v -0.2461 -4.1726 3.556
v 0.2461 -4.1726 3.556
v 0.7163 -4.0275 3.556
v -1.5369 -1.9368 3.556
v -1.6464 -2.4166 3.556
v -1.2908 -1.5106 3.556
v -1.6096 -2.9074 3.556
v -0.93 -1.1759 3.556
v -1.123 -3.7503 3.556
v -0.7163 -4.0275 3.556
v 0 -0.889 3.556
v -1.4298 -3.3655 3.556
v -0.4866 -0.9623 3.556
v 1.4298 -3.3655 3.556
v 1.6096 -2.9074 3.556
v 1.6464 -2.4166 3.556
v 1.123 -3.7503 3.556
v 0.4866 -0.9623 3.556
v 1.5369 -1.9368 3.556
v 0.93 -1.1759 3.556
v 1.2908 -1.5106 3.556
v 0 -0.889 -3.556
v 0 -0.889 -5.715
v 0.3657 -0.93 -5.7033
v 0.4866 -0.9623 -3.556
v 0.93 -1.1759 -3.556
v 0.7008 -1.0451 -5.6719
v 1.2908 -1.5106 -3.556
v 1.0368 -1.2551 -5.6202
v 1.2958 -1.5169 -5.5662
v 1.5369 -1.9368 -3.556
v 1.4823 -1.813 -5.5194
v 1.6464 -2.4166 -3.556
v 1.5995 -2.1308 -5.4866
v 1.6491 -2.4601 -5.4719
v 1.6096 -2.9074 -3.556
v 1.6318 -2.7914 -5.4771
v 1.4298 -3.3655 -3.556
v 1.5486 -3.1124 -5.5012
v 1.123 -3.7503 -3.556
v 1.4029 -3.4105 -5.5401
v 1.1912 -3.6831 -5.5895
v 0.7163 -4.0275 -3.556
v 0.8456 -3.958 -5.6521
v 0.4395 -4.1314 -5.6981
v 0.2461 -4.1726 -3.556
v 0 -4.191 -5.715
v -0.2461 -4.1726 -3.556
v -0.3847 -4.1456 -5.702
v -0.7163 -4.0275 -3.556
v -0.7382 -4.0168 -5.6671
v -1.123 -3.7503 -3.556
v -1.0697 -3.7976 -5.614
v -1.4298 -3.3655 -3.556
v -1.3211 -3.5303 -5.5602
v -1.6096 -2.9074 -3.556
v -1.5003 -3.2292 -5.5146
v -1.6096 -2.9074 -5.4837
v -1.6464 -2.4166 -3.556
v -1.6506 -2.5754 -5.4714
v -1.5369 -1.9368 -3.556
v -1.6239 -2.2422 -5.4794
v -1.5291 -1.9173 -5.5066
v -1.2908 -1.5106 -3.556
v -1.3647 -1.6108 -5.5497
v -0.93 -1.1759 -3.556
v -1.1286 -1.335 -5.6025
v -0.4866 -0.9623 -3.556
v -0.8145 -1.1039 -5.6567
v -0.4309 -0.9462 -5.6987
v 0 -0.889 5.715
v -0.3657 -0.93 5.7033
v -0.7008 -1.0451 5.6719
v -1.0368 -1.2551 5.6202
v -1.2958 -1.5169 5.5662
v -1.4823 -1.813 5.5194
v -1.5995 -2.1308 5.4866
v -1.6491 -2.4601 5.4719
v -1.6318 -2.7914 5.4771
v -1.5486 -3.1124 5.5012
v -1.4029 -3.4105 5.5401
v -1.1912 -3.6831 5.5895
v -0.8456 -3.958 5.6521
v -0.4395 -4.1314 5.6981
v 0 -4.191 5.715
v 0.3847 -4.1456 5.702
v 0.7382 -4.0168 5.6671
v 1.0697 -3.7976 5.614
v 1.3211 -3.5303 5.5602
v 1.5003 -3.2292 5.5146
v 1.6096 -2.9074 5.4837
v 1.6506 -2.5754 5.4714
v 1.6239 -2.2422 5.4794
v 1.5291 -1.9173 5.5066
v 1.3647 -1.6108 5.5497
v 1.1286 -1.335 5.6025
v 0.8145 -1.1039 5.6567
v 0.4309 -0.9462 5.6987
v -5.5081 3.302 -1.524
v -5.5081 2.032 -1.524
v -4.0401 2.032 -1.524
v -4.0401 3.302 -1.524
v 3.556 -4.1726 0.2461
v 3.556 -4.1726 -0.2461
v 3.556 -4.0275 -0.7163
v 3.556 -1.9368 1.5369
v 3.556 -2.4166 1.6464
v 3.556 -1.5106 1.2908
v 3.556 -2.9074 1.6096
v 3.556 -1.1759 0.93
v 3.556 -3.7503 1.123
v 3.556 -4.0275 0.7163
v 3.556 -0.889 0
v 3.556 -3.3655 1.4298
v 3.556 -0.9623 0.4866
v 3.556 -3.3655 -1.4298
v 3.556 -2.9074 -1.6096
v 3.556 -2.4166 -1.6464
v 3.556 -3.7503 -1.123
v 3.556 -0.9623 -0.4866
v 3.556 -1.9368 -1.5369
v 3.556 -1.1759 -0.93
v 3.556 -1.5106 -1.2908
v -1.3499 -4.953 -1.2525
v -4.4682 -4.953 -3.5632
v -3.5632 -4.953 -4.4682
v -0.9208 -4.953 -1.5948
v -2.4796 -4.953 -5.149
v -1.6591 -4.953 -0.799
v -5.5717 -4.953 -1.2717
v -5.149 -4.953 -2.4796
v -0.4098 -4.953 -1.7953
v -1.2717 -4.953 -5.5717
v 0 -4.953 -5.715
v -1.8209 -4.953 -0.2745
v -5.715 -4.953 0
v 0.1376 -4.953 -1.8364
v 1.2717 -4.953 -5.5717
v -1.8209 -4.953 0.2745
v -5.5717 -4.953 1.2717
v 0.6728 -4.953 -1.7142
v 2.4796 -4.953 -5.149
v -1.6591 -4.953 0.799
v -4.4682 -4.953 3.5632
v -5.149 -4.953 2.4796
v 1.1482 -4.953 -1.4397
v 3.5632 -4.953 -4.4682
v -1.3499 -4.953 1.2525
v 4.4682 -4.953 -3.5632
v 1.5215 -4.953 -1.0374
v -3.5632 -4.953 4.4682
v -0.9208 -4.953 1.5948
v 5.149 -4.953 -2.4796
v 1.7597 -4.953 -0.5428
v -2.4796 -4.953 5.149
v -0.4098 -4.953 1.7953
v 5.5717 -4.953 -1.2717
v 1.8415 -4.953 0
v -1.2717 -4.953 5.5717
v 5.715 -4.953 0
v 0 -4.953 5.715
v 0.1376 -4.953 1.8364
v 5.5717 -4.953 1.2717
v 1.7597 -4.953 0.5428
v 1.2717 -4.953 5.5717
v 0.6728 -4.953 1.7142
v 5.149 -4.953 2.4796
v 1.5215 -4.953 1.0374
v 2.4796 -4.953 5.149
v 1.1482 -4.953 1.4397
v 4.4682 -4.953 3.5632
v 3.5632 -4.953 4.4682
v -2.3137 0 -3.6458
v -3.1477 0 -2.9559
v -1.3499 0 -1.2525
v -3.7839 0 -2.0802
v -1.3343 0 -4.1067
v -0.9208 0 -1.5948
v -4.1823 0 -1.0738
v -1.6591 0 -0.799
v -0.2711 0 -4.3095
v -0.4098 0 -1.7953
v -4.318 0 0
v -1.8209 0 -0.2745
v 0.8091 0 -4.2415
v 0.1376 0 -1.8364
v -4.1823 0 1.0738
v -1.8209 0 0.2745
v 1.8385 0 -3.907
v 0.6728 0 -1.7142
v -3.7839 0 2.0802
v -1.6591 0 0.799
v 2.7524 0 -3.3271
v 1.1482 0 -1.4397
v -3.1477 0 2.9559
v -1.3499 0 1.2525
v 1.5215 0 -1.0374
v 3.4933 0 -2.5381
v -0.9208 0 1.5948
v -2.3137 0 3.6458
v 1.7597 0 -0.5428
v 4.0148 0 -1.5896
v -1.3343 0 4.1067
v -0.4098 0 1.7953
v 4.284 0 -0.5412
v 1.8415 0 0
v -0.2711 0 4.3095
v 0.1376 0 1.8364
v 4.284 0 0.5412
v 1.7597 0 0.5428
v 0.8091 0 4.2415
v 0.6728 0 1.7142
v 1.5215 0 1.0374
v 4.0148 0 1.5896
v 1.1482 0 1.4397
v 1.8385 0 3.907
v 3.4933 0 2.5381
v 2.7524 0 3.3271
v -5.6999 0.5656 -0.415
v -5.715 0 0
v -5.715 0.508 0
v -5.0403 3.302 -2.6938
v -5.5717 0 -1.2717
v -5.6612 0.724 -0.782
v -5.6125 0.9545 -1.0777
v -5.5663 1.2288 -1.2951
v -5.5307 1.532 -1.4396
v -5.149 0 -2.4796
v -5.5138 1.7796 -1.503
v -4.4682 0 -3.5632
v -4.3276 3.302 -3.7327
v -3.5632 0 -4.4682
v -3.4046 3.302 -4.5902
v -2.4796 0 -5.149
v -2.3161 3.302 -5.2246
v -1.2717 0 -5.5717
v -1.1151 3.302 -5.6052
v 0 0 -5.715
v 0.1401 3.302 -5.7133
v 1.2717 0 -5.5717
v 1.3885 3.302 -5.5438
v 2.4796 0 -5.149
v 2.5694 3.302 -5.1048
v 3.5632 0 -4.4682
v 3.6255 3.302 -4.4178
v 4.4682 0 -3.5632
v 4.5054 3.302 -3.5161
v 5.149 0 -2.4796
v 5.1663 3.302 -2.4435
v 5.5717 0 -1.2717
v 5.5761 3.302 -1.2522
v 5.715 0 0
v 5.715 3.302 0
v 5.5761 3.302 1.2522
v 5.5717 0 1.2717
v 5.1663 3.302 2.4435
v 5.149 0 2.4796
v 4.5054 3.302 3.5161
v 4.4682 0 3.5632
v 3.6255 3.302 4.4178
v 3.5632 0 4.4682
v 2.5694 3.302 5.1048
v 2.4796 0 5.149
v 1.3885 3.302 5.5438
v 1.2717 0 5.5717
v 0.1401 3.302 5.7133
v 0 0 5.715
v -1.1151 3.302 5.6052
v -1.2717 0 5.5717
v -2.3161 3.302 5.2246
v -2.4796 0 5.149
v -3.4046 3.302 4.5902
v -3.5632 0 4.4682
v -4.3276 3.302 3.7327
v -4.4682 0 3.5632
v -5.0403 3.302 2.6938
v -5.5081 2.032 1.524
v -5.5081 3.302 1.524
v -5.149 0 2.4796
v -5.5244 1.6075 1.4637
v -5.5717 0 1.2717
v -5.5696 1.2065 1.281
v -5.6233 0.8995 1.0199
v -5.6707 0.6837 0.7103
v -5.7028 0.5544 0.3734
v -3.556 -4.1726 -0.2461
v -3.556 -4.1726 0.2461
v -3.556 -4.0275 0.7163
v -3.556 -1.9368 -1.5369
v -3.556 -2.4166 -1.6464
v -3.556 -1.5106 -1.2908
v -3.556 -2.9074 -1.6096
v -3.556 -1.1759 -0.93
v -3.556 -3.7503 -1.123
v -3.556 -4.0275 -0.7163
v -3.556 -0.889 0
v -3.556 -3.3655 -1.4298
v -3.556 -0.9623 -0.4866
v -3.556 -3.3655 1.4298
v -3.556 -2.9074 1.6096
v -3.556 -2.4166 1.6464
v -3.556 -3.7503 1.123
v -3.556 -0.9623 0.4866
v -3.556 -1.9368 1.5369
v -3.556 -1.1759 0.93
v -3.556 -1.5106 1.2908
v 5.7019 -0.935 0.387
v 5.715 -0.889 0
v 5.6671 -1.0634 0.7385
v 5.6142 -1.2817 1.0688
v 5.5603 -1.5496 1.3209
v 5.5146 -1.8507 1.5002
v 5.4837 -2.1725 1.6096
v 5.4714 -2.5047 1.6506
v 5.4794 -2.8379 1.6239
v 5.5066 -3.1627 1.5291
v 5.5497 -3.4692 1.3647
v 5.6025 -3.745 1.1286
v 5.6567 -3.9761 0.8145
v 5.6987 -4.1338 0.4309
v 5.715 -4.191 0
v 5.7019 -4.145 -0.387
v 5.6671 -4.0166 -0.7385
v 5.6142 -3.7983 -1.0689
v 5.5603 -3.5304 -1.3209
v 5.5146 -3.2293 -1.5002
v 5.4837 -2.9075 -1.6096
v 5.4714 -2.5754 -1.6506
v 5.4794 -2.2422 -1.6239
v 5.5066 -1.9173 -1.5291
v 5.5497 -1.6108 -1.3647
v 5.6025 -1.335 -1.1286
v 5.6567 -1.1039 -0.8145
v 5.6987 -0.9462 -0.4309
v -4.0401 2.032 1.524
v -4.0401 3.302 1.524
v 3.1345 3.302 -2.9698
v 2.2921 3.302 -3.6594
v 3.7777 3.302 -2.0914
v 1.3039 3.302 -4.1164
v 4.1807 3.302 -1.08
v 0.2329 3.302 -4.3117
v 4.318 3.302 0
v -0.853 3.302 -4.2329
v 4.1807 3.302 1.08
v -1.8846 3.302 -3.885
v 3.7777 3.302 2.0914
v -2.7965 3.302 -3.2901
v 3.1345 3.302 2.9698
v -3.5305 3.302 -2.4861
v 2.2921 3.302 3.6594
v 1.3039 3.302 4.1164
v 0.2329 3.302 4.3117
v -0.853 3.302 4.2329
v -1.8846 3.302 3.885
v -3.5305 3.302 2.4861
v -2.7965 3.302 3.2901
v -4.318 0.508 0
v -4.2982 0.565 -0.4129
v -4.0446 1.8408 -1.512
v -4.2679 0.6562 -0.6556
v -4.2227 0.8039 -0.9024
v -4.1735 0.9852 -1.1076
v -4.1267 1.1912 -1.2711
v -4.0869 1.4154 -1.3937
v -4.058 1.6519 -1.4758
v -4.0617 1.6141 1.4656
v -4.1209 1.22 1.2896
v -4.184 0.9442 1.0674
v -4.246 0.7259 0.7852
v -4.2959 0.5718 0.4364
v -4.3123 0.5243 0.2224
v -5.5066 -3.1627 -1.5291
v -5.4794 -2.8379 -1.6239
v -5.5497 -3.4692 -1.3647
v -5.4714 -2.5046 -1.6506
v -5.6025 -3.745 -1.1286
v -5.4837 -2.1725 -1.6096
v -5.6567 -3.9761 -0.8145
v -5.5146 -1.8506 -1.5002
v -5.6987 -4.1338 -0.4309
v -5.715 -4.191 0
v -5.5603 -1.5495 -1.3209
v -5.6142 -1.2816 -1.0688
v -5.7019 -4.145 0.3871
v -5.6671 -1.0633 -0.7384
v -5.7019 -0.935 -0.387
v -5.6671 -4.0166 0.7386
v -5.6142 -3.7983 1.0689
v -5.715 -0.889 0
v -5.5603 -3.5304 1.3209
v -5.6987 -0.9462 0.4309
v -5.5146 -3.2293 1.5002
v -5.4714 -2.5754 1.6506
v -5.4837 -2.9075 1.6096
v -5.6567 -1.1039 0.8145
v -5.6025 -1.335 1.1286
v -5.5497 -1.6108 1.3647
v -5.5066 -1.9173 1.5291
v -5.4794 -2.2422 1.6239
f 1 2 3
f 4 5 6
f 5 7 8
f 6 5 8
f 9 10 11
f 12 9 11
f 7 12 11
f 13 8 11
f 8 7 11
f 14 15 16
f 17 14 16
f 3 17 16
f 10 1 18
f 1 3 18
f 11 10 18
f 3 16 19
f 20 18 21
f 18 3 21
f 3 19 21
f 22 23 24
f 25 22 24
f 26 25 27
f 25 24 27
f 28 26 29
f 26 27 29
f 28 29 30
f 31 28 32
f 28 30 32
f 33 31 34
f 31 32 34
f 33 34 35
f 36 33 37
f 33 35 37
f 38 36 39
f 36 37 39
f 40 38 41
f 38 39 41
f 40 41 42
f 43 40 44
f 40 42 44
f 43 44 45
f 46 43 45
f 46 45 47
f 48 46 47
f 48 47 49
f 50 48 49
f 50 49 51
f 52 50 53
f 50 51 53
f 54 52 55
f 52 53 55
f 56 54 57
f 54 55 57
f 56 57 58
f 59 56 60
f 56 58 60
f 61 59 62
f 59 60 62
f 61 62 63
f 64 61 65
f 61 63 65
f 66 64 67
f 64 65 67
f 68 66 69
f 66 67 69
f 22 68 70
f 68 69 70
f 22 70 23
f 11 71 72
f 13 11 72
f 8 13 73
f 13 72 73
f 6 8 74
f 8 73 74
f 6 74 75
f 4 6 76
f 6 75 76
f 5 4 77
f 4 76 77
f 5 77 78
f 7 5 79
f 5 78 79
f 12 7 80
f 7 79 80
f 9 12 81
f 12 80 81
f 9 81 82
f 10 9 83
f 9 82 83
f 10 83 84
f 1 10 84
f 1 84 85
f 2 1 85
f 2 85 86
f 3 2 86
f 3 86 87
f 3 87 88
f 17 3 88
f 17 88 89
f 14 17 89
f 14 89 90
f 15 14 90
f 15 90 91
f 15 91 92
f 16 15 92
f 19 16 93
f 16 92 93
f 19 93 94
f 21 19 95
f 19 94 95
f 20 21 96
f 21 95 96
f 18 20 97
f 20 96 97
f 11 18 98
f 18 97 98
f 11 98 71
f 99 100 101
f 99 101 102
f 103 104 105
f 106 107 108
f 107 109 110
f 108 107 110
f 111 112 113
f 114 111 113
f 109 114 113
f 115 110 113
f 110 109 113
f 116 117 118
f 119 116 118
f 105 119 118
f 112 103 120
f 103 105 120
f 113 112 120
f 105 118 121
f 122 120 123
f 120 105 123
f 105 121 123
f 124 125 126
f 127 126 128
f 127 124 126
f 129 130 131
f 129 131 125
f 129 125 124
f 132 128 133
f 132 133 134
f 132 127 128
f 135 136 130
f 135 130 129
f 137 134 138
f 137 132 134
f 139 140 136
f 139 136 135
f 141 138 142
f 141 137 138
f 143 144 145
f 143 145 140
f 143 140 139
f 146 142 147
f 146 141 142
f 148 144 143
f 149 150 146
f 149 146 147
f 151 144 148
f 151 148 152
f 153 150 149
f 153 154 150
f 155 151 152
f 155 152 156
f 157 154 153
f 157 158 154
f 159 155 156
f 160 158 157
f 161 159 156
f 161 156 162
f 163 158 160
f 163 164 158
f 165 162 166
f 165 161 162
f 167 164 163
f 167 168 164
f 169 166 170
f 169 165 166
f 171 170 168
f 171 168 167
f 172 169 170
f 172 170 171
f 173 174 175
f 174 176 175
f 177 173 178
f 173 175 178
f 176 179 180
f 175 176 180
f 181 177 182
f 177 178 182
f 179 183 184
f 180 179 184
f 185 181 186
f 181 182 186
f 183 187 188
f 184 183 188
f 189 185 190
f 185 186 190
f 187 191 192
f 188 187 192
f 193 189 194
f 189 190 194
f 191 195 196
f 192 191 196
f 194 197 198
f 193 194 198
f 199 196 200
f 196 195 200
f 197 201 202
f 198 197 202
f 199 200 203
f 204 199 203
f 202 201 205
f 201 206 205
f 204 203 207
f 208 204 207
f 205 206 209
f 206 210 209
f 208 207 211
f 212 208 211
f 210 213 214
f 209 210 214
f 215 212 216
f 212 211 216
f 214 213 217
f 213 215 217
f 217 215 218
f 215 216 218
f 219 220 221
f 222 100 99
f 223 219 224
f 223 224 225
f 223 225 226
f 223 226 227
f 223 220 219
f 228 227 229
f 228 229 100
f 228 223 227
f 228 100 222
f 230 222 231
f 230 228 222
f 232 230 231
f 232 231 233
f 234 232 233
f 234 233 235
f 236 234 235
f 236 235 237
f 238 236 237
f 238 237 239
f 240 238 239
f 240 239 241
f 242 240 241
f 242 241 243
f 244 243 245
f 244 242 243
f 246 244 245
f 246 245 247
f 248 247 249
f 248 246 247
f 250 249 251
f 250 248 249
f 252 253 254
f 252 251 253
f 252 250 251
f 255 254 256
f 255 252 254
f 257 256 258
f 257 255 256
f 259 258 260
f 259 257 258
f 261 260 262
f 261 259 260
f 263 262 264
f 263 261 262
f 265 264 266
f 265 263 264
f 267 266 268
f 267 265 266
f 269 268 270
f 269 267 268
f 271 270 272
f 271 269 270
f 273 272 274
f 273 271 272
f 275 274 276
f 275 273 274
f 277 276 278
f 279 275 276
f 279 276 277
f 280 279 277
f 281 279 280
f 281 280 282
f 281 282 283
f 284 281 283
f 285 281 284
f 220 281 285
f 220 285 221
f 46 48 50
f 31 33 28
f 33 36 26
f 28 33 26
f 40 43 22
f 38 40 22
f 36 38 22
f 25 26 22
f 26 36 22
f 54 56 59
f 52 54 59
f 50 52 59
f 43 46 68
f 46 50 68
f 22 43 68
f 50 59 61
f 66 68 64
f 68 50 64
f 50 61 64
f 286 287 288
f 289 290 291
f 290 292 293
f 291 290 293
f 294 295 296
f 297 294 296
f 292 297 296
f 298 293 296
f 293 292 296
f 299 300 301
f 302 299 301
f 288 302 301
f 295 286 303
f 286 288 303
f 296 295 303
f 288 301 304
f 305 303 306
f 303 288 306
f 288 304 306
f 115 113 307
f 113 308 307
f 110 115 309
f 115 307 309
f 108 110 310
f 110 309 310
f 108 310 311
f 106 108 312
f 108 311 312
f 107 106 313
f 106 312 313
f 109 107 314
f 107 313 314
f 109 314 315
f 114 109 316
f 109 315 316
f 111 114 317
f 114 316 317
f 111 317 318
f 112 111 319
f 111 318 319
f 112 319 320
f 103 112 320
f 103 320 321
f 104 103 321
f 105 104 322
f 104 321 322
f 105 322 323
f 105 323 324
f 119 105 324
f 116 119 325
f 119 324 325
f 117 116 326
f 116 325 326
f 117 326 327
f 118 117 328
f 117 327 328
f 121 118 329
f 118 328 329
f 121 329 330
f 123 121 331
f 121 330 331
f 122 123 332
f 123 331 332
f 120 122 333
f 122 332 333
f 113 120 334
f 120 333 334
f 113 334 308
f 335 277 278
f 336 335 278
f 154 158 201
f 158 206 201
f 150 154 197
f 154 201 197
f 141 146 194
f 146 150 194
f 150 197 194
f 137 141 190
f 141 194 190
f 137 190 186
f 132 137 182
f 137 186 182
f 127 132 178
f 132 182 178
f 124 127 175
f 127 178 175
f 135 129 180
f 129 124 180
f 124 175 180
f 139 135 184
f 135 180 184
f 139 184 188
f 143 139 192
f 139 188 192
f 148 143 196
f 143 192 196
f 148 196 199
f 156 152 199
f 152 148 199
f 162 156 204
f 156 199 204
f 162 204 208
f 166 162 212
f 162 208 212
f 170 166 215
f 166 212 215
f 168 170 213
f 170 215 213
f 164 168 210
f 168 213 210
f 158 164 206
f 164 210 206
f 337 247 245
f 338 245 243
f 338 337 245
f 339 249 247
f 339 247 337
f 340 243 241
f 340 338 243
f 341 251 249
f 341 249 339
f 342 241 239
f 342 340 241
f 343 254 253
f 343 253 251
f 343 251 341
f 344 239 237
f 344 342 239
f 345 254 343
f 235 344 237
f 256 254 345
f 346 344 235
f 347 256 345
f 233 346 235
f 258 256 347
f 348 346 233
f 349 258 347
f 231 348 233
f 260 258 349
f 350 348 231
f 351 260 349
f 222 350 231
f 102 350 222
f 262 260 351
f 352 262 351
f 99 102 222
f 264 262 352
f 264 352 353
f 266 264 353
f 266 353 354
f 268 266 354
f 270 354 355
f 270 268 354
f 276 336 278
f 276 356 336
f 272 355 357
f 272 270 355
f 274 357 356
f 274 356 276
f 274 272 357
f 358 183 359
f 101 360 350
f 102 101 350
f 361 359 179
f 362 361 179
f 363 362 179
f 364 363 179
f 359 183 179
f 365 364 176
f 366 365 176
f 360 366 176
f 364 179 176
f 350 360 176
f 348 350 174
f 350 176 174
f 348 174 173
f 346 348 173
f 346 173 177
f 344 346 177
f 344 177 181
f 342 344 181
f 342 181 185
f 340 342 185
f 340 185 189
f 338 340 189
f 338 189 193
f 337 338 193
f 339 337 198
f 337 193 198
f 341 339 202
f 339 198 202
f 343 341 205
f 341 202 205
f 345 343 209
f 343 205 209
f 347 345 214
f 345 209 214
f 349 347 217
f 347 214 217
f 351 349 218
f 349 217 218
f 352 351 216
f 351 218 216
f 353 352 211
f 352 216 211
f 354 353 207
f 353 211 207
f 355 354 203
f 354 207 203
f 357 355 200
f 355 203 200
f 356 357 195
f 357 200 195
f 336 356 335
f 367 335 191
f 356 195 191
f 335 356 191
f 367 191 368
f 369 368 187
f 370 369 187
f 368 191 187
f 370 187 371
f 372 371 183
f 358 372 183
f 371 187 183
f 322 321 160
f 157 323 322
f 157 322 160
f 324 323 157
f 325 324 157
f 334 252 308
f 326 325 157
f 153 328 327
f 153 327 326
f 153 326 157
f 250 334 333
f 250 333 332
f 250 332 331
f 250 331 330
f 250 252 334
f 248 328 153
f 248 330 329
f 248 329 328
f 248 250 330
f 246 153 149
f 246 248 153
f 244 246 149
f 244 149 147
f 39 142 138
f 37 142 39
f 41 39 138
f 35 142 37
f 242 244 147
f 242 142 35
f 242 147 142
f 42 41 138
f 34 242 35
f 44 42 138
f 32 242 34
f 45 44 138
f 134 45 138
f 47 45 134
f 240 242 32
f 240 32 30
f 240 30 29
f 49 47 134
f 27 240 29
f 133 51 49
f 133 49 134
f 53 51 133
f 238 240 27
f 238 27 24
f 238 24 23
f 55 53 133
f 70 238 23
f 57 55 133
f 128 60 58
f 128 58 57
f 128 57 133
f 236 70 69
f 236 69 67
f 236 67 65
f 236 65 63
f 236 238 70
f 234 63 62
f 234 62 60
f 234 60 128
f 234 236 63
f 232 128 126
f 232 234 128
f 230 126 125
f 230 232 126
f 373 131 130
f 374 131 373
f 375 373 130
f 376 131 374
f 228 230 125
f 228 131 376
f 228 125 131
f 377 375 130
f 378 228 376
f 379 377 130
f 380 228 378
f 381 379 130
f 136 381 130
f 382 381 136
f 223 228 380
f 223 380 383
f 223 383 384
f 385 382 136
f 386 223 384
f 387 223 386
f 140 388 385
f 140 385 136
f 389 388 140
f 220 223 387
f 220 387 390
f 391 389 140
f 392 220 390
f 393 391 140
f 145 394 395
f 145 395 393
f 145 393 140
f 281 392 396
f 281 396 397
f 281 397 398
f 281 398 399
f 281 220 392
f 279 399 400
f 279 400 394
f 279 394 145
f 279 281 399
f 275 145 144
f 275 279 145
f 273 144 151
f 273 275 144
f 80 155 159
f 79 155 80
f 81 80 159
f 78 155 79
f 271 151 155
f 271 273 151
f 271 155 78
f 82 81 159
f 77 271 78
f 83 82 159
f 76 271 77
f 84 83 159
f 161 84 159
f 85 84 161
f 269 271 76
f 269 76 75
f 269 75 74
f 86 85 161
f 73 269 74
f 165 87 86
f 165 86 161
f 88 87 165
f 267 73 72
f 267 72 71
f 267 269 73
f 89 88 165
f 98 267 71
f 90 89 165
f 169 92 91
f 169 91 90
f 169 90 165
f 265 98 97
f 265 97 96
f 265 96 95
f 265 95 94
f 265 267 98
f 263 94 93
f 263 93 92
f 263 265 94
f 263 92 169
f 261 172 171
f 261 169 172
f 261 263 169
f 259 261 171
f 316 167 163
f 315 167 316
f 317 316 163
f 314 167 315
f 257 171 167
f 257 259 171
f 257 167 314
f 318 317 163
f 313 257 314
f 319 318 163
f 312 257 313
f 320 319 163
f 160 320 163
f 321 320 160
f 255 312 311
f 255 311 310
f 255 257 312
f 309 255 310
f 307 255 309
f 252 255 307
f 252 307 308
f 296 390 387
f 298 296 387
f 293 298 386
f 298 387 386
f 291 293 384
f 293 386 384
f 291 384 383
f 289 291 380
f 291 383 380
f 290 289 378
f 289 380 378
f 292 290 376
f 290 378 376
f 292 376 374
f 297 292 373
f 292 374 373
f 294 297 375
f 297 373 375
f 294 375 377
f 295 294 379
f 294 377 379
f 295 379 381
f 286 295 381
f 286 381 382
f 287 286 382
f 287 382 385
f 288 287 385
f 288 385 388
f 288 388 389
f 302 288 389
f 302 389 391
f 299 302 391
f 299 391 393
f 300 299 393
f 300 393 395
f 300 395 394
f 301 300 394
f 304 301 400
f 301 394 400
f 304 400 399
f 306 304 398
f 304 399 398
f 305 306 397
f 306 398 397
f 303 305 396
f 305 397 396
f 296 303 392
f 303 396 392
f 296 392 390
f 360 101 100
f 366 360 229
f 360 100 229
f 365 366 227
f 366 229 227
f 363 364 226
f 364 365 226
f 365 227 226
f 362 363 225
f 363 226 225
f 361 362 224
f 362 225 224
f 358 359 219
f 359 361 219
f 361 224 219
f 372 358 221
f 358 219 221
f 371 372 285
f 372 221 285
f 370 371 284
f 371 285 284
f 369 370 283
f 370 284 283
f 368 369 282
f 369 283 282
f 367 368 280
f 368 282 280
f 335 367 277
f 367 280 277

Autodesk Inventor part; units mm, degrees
ref_plane "XZ Plane" through (0, 0, 0) normal (0, 1, 0) x (-1, 0, 0)
sketch "Sketch1" plane through (0, 0, 0) normal (0, 1, 0) x (-1, 0, 0)
  circle A0 centre (0, 0) radius 4.318
  circle A1 centre (0, 0) radius 5.715
  dimension "d0" = 8.636
  dimension "d1" = 11.43
extrude "Extrusion1" add sketch "Sketch1" along normal blind 3.302
sketch "Sketch2" plane through (0, 0, 0) normal (0, -1, 0) x (1, 0, 0)
  circle A0 centre (0, 0) radius 5.715 projected
  circle A1 centre (0, 0) radius 1.8415
  dimension "d4" = 3.683
extrude "Extrusion2" add sketch "Sketch2" along normal blind 4.953
ref_plane "Work Plane1" through (-5.715, 0, 0) normal (1, 0, 0) x (0, 1, 0)
sketch "Sketch3" plane through (-5.715, 0, 0) normal (1, 0, 0) x (0, 1, 0)
  circle A0 centre (-2.54, 0) radius 1.651
  line L0 (-4.953, 5.715) -> (-4.953, -5.715) projected
  point P0 (0, 0)
  dimension "d7" = 3.302
  dimension "d8" = 2.413
extrude "Extrusion3" cut sketch "Sketch3" along normal blind 2.159
pattern_circular "Circular Pattern1" count 4 over 360 about axis through (0, 0, 0) along (0, 1, 0) of "Extrusion3"
ref_plane "Work Plane2" through (-5.715, 0, 0) normal (1, 0, 0) x (0, 1, 0)
sketch "Sketch4" plane through (-5.715, 0, 0) normal (1, 0, 0) x (0, 1, 0)
  circle A0 centre (2.032, 0) radius 1.524
  line L0 (3.302, -5.715) -> (3.302, 5.715) projected
  line L1 (2.032, -1.524) -> (3.302, -1.524)
  line L2 (2.032, 1.524) -> (3.302, 1.524)
  point P0 (0, 0)
  dimension "d14" = 3.048
  dimension "d15" = 1.27
extrude "Extrusion4" cut sketch "Sketch4" along normal blind 2.159 contours A0 L0 | L2 L0 A0 | A0 L0 L1 picked at (2.3744, -0.0612)
properties part number "SpoolCarrageMagnetMountREV2" material "ABS Plastic"
